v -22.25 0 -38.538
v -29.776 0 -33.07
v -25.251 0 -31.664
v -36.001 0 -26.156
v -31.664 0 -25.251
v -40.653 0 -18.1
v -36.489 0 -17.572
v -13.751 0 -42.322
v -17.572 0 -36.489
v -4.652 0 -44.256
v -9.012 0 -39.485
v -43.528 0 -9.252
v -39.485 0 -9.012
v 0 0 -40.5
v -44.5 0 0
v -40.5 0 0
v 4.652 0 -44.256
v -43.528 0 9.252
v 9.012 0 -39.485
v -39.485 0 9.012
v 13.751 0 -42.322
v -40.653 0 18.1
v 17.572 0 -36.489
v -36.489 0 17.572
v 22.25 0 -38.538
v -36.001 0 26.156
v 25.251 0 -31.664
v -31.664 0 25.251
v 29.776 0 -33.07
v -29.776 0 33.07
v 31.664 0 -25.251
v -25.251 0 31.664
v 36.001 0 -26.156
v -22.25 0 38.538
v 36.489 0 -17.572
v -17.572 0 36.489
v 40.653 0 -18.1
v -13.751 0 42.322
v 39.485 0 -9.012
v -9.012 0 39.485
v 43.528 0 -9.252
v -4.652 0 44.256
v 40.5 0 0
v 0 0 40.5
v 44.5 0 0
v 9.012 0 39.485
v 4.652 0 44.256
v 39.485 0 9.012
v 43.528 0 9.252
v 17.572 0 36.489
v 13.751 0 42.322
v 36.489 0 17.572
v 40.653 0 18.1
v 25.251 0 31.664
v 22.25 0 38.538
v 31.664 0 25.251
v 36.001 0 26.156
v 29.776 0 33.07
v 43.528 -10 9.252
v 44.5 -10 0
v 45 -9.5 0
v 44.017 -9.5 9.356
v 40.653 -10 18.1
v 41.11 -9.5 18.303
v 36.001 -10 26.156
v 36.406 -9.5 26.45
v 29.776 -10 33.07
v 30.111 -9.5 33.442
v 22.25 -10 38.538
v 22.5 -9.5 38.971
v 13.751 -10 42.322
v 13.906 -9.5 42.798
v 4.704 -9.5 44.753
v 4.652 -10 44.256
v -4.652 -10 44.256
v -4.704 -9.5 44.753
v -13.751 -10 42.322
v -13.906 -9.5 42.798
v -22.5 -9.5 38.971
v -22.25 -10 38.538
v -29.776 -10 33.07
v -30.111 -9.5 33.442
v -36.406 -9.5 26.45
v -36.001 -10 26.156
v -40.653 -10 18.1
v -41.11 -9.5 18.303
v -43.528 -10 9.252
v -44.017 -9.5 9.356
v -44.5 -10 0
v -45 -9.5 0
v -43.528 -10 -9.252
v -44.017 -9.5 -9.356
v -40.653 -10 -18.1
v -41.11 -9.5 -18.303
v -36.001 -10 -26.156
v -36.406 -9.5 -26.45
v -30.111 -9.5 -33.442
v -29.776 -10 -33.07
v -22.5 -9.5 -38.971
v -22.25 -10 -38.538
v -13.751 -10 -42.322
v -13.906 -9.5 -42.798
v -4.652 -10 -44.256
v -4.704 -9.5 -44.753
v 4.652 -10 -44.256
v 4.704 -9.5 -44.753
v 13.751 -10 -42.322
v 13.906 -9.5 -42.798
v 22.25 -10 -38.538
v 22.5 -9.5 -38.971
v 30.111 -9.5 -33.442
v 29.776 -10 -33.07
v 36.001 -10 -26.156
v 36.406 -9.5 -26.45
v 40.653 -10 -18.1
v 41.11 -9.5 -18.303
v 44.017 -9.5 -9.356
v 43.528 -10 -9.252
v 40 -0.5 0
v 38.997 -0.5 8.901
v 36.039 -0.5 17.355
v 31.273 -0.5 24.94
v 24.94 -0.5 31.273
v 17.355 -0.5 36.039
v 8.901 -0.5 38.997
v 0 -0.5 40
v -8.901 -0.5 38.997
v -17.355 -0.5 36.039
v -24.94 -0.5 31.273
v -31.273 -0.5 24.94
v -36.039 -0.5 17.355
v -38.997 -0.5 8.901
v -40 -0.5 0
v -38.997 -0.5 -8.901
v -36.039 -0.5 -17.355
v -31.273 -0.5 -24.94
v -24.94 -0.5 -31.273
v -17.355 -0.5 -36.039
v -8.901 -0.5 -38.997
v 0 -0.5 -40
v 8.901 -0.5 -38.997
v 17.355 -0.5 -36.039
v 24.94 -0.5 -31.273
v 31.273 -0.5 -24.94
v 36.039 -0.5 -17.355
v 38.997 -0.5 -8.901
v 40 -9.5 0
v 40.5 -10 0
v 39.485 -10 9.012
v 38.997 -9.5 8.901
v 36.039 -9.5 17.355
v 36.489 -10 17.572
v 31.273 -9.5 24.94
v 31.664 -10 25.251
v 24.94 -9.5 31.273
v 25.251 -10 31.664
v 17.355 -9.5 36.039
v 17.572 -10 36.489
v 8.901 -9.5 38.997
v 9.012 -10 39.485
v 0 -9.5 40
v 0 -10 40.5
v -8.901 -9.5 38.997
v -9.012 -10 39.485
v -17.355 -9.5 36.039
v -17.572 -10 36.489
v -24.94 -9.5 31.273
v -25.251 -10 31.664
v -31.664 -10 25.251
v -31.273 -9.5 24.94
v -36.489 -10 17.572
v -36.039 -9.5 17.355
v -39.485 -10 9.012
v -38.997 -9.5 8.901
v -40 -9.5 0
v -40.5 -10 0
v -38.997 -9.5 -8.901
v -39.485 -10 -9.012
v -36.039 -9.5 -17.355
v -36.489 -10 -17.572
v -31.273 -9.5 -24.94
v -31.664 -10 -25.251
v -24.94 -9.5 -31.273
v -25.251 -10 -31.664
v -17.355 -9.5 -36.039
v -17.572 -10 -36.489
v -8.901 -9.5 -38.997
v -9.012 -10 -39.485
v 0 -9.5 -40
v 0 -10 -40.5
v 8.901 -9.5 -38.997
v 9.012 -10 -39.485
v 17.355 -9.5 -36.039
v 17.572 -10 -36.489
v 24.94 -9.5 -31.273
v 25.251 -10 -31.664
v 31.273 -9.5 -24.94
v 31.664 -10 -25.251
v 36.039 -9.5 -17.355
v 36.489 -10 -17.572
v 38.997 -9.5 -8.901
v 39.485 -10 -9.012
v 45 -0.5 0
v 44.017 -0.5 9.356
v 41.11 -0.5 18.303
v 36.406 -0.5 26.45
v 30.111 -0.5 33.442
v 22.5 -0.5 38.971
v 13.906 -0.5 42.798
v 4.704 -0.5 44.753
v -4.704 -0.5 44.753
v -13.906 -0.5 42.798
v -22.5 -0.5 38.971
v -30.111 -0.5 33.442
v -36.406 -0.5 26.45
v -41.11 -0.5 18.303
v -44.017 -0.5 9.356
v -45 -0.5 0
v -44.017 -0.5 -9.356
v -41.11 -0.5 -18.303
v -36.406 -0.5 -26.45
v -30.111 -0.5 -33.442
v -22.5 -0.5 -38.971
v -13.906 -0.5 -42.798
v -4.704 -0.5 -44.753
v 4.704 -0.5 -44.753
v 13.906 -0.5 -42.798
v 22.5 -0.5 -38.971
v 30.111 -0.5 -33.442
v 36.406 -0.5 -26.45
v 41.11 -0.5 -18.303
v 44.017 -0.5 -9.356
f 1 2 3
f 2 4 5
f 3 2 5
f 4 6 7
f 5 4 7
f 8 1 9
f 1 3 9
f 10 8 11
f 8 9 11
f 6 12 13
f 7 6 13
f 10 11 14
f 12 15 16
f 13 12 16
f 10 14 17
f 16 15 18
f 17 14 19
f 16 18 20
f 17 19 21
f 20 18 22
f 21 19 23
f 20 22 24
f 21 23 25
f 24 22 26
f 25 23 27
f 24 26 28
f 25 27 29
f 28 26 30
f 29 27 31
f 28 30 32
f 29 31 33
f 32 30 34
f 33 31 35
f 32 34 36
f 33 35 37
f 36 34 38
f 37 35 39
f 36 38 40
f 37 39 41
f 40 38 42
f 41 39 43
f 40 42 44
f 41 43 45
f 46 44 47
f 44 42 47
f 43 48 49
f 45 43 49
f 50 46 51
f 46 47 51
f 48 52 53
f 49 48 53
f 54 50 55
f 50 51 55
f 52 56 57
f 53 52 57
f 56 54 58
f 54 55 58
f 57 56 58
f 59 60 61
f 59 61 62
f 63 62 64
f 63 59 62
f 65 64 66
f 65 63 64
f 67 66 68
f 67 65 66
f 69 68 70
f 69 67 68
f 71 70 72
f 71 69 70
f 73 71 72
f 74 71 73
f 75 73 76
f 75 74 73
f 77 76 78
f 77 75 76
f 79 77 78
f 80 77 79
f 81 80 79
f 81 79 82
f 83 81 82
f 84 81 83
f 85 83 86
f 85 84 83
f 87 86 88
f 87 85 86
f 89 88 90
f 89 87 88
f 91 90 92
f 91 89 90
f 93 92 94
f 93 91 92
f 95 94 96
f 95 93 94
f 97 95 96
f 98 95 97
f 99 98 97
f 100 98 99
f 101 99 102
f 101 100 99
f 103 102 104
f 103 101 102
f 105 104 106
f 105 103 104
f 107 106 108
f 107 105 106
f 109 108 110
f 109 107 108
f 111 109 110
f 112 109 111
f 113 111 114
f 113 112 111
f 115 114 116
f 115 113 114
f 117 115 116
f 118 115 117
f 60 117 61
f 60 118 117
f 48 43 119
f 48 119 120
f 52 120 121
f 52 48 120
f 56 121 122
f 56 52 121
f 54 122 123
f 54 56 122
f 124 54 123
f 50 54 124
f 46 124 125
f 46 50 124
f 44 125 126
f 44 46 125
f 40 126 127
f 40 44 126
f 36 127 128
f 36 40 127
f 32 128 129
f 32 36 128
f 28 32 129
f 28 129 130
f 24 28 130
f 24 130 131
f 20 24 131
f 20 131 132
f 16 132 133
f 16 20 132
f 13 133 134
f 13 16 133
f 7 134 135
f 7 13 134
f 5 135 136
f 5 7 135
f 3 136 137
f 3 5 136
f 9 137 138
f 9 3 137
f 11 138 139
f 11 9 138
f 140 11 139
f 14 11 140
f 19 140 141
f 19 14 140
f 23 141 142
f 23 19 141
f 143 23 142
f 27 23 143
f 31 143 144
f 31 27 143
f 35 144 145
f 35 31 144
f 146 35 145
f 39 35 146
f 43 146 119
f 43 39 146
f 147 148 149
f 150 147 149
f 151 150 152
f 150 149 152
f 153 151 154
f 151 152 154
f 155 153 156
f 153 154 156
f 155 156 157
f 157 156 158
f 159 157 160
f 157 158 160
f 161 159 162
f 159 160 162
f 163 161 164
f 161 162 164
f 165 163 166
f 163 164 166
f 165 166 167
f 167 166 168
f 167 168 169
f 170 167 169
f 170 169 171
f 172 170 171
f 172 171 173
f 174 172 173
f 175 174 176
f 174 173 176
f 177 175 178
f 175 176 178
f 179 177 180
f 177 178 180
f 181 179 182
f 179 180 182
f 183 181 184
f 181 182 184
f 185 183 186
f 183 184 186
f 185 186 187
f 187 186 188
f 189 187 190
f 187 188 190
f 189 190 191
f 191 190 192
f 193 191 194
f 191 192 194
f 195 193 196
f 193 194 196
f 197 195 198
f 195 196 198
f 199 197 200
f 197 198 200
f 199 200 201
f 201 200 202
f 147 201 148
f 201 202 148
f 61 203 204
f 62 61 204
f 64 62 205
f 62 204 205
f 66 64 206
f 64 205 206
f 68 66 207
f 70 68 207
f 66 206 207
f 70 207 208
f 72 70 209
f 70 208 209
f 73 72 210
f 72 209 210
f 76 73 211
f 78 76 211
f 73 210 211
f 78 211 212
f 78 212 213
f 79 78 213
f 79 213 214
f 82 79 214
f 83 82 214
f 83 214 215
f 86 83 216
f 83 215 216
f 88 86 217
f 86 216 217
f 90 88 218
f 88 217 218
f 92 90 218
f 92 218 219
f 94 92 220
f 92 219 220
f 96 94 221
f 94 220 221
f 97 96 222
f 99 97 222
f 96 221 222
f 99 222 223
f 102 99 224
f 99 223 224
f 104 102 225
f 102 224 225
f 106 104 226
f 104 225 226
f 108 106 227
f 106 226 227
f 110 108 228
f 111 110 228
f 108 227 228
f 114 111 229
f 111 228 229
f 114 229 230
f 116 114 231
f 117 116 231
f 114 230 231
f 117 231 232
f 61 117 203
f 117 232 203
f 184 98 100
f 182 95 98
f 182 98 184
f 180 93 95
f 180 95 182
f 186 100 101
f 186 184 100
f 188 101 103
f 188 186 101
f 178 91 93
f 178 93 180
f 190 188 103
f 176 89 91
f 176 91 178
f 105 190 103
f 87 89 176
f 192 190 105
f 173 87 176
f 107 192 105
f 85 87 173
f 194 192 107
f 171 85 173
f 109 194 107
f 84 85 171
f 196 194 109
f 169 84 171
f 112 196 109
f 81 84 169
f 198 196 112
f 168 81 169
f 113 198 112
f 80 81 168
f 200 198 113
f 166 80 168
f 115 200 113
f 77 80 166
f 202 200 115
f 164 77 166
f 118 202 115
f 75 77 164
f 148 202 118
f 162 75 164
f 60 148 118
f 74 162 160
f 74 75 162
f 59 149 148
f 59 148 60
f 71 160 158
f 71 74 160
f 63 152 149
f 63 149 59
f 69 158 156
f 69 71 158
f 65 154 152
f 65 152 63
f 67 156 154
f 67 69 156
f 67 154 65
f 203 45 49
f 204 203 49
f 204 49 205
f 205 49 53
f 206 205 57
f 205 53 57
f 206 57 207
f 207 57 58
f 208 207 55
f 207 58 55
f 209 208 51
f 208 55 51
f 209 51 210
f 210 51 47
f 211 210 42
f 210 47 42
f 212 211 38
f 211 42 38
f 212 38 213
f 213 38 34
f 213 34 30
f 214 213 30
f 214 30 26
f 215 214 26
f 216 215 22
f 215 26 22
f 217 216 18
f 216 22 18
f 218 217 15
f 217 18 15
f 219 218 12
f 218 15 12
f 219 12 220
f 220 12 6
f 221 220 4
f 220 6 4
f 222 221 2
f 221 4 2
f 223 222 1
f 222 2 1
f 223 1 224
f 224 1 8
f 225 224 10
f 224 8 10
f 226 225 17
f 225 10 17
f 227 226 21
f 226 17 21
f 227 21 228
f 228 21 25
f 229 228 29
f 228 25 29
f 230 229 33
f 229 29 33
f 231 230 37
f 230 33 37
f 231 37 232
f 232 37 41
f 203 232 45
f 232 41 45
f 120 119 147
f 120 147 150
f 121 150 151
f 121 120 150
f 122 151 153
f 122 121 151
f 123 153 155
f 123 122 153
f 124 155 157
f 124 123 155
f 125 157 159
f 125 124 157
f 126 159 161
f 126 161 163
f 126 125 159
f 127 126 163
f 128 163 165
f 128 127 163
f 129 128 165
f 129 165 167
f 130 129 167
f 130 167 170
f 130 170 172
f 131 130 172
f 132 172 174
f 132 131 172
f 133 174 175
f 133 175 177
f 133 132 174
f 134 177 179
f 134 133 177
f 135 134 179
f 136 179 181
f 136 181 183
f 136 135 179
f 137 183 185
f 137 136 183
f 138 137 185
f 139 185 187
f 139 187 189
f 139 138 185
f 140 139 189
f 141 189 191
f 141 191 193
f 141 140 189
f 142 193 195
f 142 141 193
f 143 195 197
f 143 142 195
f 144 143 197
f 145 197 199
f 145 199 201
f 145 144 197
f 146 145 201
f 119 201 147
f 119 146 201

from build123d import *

# Parameters (mm, degrees)
SKETCH_R     = 45
SKETCH_R_2   = 40
PAD_DEPTH    = 10
CHAMFER_SIZE = 0.5


with BuildPart() as part:
    # Sketch → Pad (new body)
    with BuildSketch(Plane.XZ):
        Circle(SKETCH_R)
        Circle(SKETCH_R_2, mode=Mode.SUBTRACT)
    extrude(amount=PAD_DEPTH)

    # Chamfer
    chamfer_edges = [part.edges().sort_by_distance(p)[0] for p in [
        (-45, -10, 0),
        (-40, -10, 0),
        (-45, 0, 0),
        (-40, 0, 0),
    ]]
    chamfer(chamfer_edges, length=CHAMFER_SIZE)


solid = part.part
